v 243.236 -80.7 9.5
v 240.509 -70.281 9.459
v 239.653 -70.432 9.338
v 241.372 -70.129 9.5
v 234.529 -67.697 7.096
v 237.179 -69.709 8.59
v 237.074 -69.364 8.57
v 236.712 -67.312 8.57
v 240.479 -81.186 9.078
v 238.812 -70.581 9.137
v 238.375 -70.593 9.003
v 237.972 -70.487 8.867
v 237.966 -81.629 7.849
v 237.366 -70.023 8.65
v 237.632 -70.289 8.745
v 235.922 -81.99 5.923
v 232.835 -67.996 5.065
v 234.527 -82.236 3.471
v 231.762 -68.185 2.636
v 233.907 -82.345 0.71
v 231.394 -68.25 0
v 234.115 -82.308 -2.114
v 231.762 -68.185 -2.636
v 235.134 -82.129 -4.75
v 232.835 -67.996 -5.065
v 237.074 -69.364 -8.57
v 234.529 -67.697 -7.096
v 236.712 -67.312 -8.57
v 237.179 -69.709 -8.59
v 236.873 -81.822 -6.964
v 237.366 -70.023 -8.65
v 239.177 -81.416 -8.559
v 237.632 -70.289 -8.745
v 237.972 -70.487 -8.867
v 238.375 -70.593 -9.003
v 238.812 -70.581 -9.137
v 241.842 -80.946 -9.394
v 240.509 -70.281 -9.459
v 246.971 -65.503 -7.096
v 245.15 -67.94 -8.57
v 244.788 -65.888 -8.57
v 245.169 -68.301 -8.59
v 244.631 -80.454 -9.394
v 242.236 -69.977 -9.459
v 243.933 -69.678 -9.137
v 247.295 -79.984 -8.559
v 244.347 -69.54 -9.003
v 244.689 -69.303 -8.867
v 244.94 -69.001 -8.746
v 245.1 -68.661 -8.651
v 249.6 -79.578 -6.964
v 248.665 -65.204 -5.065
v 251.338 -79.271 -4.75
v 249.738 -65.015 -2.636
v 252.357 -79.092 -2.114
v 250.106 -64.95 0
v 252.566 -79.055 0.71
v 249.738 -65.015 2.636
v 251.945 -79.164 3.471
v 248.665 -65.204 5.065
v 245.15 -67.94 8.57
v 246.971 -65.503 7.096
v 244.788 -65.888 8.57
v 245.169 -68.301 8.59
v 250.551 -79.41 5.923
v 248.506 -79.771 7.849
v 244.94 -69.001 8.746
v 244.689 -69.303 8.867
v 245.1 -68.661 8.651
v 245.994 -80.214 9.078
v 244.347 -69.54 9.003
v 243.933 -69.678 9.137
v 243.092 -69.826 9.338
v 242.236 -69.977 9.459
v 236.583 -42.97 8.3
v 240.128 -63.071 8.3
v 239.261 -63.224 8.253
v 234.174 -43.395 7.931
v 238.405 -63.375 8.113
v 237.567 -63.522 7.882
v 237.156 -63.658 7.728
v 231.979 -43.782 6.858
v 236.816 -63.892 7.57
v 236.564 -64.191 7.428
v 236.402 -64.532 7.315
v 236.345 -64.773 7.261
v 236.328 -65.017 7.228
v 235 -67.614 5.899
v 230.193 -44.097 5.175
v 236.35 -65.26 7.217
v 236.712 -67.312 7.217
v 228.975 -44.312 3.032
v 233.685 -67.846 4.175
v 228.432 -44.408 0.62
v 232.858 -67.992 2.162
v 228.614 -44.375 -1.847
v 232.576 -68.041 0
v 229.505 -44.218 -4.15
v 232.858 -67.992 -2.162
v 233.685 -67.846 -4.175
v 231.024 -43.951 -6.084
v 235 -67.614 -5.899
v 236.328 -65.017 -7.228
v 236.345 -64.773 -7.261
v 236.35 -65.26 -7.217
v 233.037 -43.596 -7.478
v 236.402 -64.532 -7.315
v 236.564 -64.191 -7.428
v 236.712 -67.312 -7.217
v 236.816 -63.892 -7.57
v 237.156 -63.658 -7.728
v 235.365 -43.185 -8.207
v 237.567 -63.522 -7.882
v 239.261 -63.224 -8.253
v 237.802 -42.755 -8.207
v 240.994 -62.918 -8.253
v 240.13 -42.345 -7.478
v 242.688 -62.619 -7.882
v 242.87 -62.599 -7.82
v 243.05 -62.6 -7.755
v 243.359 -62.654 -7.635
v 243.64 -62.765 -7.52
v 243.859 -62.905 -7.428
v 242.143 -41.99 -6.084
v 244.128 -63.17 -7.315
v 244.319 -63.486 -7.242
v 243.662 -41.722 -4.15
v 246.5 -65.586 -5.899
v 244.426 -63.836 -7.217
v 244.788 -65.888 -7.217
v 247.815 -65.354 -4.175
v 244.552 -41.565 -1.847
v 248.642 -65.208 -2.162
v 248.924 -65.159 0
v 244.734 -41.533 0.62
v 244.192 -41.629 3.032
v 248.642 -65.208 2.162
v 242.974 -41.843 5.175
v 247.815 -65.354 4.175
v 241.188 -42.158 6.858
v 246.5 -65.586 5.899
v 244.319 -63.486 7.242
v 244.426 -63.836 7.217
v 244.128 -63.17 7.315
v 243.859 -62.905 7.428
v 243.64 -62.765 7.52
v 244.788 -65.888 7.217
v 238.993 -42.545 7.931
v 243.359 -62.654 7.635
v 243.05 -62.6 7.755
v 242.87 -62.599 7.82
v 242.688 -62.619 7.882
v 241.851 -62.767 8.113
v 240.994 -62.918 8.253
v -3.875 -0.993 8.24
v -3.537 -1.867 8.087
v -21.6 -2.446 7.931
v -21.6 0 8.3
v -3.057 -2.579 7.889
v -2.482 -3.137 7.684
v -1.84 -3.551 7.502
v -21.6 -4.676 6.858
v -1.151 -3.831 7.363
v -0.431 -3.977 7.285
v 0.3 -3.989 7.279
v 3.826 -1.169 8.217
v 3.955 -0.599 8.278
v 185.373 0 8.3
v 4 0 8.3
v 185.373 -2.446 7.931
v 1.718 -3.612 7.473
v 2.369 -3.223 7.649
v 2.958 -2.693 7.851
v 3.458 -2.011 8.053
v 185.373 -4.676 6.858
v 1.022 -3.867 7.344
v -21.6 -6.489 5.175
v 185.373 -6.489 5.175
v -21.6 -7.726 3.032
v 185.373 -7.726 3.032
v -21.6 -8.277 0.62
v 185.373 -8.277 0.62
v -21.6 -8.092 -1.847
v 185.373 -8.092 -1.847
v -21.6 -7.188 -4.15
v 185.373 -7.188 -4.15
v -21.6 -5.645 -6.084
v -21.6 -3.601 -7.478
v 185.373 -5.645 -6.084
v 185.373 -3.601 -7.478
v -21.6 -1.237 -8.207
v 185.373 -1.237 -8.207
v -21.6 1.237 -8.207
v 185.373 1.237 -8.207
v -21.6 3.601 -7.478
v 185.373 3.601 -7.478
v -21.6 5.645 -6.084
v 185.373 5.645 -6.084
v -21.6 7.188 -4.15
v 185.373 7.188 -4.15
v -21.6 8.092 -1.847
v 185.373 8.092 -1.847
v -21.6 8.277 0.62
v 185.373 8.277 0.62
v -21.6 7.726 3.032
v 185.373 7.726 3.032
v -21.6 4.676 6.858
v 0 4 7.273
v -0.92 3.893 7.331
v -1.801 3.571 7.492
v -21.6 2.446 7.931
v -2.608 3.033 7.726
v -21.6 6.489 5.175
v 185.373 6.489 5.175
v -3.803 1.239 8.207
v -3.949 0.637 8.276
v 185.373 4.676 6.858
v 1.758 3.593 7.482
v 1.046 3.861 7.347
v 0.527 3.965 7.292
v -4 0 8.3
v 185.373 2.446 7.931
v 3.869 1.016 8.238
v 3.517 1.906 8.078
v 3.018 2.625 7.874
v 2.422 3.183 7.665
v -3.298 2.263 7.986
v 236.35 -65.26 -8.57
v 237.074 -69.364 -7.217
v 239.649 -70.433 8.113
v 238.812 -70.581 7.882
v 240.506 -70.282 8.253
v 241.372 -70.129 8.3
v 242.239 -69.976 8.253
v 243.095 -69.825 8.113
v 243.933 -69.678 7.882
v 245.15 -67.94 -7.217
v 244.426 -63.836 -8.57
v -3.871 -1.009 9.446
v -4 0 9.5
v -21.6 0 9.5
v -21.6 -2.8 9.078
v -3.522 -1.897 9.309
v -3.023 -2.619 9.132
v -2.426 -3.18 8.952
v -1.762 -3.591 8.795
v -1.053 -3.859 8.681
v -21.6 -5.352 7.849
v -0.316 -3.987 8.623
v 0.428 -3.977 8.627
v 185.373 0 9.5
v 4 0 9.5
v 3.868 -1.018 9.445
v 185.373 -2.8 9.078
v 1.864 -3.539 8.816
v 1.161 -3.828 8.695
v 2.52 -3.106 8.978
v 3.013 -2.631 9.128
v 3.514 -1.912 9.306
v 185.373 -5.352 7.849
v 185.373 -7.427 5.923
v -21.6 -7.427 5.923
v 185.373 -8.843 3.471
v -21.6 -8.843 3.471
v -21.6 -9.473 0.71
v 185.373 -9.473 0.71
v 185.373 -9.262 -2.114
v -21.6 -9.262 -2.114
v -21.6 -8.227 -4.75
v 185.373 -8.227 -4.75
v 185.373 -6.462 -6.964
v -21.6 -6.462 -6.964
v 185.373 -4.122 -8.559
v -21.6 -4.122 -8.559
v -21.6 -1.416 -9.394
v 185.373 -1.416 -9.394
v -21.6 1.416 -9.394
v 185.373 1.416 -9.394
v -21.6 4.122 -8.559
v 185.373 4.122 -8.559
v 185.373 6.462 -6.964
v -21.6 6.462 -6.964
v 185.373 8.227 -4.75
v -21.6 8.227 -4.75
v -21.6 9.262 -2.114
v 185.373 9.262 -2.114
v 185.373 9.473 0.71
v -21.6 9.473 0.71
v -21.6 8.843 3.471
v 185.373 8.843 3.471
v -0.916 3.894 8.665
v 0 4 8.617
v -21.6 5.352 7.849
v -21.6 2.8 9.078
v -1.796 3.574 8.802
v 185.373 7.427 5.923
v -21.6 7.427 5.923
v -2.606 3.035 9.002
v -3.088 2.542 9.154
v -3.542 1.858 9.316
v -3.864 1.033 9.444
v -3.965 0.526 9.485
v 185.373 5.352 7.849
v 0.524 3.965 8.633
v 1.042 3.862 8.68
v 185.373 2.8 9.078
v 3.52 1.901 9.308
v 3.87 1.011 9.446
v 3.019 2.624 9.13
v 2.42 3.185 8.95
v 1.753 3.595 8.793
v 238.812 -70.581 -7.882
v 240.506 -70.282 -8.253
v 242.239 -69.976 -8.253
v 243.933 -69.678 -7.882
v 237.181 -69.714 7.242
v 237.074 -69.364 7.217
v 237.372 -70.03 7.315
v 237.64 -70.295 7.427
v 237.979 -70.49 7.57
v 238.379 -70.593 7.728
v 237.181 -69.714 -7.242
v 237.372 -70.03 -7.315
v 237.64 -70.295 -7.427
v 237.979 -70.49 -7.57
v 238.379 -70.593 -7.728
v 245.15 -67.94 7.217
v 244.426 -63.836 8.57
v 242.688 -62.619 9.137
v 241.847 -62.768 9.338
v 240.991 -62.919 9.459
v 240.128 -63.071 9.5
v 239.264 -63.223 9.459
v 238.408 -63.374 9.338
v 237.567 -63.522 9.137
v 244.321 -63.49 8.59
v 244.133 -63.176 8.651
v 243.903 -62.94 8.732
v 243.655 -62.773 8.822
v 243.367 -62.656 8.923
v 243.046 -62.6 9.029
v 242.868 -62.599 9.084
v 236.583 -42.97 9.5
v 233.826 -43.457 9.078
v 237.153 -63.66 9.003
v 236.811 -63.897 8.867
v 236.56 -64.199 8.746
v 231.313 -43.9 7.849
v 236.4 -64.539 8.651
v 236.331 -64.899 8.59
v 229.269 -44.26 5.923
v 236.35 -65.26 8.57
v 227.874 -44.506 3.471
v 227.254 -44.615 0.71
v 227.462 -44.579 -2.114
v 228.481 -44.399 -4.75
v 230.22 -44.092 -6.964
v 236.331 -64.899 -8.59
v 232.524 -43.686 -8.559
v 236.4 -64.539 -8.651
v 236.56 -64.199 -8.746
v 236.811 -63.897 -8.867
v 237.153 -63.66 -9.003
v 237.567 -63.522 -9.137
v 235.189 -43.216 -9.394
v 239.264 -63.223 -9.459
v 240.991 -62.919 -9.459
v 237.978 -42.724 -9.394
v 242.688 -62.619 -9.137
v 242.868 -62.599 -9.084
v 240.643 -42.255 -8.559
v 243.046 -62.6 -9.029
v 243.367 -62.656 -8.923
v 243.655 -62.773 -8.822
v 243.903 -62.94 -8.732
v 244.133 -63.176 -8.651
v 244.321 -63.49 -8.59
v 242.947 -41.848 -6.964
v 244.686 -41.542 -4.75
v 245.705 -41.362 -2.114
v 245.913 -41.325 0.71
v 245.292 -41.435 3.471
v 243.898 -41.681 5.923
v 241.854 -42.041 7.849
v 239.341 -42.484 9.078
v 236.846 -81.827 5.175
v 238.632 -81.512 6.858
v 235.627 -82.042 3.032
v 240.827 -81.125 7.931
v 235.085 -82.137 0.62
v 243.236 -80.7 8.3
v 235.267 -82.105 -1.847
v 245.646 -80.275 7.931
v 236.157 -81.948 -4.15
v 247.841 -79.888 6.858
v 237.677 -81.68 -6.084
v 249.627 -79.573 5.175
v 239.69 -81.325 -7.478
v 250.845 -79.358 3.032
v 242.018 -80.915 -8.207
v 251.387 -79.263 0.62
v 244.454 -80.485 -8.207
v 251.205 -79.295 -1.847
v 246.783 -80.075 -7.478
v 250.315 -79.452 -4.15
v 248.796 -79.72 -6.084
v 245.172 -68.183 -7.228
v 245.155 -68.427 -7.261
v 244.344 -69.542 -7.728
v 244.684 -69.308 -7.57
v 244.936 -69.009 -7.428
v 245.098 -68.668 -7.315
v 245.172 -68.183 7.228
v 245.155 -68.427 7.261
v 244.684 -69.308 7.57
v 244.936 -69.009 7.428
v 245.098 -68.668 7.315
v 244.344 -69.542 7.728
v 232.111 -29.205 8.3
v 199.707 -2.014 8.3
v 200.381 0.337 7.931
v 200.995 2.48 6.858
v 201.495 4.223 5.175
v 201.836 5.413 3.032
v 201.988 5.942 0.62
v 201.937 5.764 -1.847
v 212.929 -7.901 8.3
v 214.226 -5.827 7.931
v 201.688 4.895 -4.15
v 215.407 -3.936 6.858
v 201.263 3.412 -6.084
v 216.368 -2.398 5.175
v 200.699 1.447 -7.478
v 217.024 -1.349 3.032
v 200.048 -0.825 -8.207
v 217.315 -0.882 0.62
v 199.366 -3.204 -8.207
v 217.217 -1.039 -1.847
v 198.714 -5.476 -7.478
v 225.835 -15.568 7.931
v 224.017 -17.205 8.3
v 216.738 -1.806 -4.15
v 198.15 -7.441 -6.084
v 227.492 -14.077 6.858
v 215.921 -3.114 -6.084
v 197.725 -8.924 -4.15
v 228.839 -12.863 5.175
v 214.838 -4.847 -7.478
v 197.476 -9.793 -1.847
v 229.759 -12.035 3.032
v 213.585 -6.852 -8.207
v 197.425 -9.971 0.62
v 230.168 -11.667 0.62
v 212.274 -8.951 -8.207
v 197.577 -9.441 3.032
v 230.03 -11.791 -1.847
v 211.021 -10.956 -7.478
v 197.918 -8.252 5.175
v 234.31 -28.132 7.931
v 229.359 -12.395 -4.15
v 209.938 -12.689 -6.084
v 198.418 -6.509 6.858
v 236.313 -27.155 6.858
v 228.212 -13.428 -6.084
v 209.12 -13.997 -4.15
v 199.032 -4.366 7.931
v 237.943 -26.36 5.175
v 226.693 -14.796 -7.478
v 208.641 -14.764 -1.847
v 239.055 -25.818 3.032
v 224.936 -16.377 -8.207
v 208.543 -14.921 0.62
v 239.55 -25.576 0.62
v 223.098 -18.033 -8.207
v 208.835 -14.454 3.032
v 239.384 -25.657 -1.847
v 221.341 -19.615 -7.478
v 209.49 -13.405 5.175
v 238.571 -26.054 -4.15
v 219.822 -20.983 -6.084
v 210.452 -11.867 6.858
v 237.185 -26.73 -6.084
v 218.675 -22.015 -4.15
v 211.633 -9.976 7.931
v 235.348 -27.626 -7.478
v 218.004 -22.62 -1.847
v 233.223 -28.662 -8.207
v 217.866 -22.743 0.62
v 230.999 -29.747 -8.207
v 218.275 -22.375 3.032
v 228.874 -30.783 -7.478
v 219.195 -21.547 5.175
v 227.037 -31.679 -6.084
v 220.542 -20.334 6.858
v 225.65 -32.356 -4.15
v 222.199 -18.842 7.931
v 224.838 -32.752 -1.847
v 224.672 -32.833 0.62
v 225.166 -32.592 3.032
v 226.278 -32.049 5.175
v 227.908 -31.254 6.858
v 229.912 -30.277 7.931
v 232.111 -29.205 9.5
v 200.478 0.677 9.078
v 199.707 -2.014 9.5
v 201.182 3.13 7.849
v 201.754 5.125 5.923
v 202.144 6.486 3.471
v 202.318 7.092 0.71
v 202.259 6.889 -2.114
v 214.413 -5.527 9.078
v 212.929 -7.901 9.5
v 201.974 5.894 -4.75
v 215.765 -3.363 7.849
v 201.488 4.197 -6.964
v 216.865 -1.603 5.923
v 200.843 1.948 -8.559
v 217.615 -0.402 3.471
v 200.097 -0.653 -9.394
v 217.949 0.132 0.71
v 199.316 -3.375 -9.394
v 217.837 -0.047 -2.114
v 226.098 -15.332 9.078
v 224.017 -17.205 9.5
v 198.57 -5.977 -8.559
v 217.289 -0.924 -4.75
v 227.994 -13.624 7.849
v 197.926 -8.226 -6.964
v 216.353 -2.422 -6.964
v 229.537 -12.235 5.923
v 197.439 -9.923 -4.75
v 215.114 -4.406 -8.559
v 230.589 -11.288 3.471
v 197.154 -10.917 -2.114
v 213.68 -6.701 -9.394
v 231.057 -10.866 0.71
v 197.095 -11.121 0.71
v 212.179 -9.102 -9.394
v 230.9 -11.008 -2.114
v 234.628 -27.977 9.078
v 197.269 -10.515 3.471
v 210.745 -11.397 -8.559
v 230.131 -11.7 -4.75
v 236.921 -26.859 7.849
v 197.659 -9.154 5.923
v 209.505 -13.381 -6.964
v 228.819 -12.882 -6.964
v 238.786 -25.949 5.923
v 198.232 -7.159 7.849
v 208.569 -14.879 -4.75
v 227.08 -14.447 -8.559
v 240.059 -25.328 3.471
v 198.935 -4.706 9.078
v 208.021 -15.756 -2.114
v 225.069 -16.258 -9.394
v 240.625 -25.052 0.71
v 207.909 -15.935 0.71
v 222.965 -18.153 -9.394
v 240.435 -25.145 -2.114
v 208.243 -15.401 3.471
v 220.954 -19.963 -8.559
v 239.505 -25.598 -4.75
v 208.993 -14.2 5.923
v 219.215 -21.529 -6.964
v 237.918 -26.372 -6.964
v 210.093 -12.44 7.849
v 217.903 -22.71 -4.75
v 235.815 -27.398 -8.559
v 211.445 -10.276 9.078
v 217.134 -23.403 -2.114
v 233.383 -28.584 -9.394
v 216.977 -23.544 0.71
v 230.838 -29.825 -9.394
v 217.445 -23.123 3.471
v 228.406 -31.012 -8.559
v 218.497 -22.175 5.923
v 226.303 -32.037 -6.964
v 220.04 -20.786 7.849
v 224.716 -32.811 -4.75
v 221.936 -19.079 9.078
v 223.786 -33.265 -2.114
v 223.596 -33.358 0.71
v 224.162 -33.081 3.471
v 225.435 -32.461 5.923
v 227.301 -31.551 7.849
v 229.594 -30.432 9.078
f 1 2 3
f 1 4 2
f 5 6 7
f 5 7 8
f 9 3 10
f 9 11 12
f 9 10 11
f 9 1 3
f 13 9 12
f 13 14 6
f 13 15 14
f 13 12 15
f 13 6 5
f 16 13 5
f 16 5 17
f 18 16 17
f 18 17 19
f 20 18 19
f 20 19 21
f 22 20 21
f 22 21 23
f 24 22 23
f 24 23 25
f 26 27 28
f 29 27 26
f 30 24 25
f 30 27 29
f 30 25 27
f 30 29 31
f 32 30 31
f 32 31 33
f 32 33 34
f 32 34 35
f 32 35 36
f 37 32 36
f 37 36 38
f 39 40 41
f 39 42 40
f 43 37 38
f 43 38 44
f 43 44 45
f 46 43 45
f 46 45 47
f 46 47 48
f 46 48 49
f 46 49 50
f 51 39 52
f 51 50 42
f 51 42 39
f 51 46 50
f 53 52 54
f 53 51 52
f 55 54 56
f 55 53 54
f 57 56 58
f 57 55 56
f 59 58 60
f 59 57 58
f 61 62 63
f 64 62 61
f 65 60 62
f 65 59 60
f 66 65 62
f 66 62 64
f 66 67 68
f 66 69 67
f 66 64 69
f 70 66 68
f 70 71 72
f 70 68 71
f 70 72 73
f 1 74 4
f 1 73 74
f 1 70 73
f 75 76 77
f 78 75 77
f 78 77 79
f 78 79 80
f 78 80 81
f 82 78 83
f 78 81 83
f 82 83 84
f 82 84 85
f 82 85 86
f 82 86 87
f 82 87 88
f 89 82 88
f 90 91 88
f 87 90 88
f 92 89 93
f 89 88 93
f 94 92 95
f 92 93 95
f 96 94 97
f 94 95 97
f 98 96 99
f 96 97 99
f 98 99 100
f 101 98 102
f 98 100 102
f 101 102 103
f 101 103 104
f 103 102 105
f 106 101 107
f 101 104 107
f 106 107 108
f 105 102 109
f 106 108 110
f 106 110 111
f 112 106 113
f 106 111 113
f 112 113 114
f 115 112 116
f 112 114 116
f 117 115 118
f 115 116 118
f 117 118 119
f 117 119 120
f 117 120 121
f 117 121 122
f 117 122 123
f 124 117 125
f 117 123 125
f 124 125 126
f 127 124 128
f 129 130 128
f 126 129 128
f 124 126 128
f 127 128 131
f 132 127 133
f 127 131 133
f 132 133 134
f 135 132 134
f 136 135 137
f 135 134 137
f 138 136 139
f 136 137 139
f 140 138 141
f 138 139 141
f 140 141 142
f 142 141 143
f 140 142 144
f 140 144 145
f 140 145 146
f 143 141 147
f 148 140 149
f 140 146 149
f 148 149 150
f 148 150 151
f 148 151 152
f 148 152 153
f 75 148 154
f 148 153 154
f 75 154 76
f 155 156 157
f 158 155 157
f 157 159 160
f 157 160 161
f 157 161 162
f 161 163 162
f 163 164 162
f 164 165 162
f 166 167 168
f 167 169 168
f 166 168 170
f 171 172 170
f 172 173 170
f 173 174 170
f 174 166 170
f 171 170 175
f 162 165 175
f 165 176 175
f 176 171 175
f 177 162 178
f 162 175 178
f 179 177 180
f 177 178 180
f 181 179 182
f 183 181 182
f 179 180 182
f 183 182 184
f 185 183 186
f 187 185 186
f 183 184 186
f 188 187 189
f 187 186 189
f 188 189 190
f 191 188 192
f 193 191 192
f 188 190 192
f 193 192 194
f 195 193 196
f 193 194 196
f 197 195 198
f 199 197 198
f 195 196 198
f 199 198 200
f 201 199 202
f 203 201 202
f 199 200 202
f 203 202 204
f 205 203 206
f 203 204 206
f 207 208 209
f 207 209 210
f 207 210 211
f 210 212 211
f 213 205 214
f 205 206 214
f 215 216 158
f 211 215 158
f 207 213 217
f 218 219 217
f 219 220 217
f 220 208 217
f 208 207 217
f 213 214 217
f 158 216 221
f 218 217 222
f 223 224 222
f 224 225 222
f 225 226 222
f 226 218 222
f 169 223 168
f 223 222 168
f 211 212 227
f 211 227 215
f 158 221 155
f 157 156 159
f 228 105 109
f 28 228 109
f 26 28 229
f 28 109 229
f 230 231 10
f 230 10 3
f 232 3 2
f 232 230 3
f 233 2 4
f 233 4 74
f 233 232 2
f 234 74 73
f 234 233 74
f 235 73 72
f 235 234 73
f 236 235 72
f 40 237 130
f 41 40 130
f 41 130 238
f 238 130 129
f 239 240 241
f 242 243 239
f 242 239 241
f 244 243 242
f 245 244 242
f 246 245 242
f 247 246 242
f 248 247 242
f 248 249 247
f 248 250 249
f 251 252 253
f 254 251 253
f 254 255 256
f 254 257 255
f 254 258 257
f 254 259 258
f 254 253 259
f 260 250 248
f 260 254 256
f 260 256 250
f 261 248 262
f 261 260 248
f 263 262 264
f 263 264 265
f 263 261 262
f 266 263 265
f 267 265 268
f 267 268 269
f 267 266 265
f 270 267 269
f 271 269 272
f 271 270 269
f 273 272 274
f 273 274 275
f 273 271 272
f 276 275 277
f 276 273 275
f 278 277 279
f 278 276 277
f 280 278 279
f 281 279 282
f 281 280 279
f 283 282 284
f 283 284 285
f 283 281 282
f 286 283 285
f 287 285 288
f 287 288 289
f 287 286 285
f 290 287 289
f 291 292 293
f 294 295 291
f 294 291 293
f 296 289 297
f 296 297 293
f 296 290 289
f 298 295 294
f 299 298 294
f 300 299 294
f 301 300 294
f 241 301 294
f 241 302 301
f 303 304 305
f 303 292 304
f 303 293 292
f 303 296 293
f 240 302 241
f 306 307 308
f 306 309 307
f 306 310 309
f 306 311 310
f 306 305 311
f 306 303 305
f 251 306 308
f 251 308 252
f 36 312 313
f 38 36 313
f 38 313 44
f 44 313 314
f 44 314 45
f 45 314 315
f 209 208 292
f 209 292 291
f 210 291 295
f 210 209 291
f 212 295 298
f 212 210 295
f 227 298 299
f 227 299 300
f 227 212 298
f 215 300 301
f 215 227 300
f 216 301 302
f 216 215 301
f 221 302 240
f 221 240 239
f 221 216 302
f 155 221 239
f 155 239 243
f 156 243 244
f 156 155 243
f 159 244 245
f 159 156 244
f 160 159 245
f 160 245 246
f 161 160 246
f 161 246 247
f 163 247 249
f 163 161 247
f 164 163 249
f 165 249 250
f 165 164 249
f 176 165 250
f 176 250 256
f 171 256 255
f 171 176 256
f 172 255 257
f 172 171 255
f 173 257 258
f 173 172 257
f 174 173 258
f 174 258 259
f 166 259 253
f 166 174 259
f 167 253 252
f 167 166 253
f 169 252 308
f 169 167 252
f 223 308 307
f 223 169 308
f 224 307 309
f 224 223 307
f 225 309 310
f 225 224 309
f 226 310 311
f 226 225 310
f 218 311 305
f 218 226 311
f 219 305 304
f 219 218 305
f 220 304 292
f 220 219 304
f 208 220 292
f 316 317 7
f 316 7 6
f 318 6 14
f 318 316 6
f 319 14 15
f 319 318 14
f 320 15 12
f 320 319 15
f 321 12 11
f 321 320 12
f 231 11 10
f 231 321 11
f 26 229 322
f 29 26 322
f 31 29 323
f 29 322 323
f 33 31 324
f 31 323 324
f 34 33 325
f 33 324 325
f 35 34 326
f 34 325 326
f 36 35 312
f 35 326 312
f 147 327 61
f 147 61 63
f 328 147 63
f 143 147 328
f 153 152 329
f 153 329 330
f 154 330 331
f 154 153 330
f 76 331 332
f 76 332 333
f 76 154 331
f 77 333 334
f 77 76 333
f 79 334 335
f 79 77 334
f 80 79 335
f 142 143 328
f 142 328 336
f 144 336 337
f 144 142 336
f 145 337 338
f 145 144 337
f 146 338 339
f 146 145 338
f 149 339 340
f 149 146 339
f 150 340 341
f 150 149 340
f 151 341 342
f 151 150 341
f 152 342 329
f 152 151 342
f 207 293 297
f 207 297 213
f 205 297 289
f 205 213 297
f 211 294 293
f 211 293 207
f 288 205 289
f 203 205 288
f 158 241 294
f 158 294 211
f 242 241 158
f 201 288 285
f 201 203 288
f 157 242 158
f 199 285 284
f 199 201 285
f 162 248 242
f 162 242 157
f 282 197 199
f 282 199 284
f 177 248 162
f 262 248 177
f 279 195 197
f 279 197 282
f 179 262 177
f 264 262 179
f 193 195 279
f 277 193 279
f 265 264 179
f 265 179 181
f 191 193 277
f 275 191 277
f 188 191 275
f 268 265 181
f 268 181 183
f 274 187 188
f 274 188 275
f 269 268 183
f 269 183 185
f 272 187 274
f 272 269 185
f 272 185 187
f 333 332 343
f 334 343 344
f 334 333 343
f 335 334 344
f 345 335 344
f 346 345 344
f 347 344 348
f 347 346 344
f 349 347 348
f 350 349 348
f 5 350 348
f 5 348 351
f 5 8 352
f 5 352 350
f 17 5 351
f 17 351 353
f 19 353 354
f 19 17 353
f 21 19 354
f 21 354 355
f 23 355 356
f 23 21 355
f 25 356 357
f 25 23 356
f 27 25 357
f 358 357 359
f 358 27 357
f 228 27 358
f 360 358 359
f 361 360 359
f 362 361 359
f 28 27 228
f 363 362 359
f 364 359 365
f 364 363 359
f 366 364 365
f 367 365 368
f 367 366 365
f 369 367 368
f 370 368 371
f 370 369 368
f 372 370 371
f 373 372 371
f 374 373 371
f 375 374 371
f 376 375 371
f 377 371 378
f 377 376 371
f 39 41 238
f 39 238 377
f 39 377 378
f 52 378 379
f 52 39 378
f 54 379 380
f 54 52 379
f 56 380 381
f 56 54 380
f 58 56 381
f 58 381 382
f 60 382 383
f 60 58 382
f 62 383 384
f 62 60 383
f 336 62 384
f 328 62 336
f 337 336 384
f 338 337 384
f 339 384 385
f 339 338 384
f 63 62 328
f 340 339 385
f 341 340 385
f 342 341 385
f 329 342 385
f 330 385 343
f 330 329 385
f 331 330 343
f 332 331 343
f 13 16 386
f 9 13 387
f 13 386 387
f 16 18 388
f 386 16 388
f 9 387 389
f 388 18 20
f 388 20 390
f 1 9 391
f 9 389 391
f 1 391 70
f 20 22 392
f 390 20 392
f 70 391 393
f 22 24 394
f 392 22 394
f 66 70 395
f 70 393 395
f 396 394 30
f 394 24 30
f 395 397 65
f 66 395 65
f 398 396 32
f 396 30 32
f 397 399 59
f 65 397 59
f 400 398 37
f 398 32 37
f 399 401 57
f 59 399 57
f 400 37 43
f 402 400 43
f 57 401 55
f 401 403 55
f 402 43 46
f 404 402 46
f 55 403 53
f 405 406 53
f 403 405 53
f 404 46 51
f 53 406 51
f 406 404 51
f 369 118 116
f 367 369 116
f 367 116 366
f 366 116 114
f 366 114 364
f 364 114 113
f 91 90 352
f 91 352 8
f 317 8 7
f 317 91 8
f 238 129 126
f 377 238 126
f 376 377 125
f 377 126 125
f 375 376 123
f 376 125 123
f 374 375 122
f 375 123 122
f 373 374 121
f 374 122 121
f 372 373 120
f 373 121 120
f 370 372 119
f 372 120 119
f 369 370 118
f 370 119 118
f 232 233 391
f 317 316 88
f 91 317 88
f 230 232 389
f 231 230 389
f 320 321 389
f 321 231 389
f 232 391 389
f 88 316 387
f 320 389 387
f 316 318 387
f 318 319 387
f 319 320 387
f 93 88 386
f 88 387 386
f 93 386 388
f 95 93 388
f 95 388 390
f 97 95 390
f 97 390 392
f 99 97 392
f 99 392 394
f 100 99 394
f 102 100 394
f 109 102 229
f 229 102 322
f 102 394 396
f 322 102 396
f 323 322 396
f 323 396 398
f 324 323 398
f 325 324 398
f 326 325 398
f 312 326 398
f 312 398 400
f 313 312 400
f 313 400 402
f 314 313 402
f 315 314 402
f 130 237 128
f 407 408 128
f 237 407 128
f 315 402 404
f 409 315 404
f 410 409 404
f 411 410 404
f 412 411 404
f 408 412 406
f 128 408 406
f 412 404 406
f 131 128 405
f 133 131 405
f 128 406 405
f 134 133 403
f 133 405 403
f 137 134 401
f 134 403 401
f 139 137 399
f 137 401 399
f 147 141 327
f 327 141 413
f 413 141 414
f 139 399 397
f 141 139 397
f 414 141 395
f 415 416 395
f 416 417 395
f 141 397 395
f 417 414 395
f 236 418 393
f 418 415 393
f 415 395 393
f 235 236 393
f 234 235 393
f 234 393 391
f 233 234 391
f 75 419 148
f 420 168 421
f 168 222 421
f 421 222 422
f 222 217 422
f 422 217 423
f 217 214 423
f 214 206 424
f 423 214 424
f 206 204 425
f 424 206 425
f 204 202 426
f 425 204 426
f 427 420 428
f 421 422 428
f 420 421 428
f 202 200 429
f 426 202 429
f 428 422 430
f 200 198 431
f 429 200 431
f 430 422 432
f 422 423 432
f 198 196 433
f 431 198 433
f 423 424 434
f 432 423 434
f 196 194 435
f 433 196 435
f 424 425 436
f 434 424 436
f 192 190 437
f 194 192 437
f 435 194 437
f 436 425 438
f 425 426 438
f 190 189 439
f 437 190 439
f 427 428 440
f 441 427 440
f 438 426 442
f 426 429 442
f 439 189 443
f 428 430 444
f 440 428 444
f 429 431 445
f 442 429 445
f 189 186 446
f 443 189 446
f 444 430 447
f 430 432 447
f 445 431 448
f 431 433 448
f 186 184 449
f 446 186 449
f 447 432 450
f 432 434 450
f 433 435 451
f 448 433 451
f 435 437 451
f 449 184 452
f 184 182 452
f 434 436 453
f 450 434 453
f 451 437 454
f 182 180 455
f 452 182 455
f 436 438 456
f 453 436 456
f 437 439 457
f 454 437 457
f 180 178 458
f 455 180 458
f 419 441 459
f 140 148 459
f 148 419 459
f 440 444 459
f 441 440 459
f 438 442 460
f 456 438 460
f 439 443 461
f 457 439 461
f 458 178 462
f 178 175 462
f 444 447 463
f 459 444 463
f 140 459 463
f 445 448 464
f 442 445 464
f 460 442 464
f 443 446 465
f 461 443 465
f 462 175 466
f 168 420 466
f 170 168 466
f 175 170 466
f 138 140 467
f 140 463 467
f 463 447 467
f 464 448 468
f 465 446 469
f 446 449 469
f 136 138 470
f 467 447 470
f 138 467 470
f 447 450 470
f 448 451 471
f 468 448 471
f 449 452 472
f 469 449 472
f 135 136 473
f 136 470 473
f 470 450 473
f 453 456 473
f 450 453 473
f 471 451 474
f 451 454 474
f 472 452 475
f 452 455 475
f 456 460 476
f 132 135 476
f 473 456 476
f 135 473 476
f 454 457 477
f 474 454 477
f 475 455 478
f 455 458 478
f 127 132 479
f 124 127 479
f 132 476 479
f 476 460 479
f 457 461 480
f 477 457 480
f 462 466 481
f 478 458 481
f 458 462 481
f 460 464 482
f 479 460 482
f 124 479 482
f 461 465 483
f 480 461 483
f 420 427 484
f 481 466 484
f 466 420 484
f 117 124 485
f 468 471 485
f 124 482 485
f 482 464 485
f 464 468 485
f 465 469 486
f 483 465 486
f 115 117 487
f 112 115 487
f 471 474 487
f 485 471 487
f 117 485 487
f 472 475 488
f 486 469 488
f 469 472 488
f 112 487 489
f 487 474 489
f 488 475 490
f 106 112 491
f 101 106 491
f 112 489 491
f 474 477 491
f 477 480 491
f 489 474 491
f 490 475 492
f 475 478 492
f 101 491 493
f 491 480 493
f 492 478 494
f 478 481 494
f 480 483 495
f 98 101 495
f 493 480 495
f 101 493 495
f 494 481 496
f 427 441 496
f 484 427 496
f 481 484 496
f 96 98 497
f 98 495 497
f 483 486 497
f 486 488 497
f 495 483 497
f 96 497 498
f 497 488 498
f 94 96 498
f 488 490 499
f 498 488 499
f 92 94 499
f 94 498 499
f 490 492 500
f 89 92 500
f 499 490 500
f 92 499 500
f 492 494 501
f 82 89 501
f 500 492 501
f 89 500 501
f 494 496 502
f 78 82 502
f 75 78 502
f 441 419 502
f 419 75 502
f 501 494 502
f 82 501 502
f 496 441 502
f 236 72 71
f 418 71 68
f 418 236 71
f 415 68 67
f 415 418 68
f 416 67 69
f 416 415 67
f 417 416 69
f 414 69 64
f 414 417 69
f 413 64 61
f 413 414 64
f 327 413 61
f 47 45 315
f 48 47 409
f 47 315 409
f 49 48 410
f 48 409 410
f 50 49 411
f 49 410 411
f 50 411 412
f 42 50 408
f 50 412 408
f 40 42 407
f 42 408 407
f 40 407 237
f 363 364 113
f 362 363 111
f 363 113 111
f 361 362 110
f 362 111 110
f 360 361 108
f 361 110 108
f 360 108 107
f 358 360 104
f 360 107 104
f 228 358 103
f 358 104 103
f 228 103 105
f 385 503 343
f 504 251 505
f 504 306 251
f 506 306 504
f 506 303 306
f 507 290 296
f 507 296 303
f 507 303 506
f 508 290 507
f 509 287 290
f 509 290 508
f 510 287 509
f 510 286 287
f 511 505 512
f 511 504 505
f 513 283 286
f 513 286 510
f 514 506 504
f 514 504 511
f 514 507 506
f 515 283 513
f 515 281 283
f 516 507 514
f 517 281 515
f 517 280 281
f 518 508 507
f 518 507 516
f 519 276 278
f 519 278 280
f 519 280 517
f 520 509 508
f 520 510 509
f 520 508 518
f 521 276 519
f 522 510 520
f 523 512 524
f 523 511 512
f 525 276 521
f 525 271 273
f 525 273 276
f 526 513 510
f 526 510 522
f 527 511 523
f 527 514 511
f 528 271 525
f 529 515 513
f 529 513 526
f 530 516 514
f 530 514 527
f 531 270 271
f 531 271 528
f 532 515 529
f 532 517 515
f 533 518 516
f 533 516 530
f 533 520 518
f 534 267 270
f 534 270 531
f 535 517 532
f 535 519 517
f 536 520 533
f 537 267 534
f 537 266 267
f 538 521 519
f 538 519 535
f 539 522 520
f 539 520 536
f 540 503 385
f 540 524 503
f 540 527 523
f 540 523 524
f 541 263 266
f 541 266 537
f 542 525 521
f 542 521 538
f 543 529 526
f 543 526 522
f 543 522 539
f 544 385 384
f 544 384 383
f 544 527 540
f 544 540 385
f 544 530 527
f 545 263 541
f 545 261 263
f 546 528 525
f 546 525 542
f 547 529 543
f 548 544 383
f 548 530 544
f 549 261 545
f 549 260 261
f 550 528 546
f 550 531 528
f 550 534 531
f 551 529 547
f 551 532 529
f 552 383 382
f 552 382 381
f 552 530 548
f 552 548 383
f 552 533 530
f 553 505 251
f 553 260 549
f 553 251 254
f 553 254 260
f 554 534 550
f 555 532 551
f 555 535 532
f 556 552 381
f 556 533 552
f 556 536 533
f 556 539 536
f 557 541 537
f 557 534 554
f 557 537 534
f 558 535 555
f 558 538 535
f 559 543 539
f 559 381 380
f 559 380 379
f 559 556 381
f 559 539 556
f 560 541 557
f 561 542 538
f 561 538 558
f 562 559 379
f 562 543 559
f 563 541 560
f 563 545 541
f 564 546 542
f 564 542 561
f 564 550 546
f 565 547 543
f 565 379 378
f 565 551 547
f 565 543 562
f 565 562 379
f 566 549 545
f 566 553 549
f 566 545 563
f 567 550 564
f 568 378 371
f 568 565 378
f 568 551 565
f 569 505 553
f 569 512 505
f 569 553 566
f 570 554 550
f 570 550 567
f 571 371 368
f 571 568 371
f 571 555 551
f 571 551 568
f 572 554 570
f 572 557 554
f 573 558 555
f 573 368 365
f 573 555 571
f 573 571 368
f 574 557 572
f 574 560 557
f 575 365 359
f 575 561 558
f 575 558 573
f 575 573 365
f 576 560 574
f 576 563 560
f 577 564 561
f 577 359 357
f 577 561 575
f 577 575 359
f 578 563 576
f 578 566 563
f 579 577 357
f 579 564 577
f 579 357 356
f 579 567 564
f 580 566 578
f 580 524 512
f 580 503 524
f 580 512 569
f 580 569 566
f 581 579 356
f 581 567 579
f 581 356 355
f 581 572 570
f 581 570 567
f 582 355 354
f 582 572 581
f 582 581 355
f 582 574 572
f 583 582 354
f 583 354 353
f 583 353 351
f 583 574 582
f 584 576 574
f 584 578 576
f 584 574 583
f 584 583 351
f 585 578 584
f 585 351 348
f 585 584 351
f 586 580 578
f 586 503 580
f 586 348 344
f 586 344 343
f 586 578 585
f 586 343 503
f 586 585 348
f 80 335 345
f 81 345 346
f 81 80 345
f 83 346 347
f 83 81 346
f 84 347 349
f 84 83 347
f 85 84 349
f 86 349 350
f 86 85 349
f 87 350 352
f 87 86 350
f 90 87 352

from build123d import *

# Parameters (mm, degrees)
SKETCH2_R                      = 9.5
SKETCH2_R_2                    = 8.3
CUT_EXTRUDE1_REACH             = 267.847
CUT_EXTRUDE1_DIRECTION_2_REACH = 267.847
CUT_EXTRUDE2_REACH             = 267.847
CUT_EXTRUDE2_END_RADIUS        = 9.5
SKETCH4_R                      = 4


with BuildPart() as part:
    # Sweep1: sweep along a path in Sketch1
    with BuildLine(Plane.XY) as sweep1_path:
        Line((-21.6, 0), (0, 0))
        Line((0, 0), (185.373442264, 0))
        ThreePointArc((185.373442264, 0), (218.798397967, -12.165688958), (236.58344542, -42.970294761))
        Line((236.58344542, -42.970294761), (240.75, -66.6))
        Line((240.75, -66.6), (243.236210428, -80.7))
    # Sketch2 → Sweep1 (sweep)
    with BuildSketch(Plane.ZY.offset(21.6)):
        Circle(SKETCH2_R)
        Circle(SKETCH2_R_2, mode=Mode.SUBTRACT)
    sweep(path=sweep1_path.line)

    # Sketch3 → Cut-Extrude1 (cut, up to next)
    with BuildSketch(Plane.XY, mode=Mode.PRIVATE) as cut_extrude1_sk1:
        with BuildLine():
            Line((245.149518391, -67.939949686), (244.425905183, -63.836135257))
            ThreePointArc((244.425905183, -63.836135257), (243.809058208, -62.867879457), (242.688221287, -62.619395894))
            Line((242.688221287, -62.619395894), (237.567220972, -63.522366418))
            ThreePointArc((237.567220972, -63.522366418), (236.598965172, -64.139213393), (236.350481609, -65.260050314))
            Line((236.350481609, -65.260050314), (237.074094817, -69.363864743))
            ThreePointArc((237.074094817, -69.363864743), (237.690941792, -70.332120543), (238.811778713, -70.580604106))
            Line((238.811778713, -70.580604106), (243.932779028, -69.677633582))
            ThreePointArc((243.932779028, -69.677633582), (244.901034828, -69.060786607), (245.149518391, -67.939949686))
        make_face()
    cut_extrude1_tool1 = extrude(cut_extrude1_sk1.sketch, amount=-CUT_EXTRUDE1_REACH, mode=Mode.PRIVATE) & part.part
    add(cut_extrude1_tool1.solids().sort_by_distance((240.75, -66.6, 0))[0], mode=Mode.SUBTRACT)

    # Sketch3 → Cut-Extrude1 direction 2 (cut, up to next)
    with BuildSketch(Plane.XY, mode=Mode.PRIVATE) as cut_extrude1_direction_2_sk1:
        with BuildLine():
            Line((245.149518391, -67.939949686), (244.425905183, -63.836135257))
            ThreePointArc((244.425905183, -63.836135257), (243.809058208, -62.867879457), (242.688221287, -62.619395894))
            Line((242.688221287, -62.619395894), (237.567220972, -63.522366418))
            ThreePointArc((237.567220972, -63.522366418), (236.598965172, -64.139213393), (236.350481609, -65.260050314))
            Line((236.350481609, -65.260050314), (237.074094817, -69.363864743))
            ThreePointArc((237.074094817, -69.363864743), (237.690941792, -70.332120543), (238.811778713, -70.580604106))
            Line((238.811778713, -70.580604106), (243.932779028, -69.677633582))
            ThreePointArc((243.932779028, -69.677633582), (244.901034828, -69.060786607), (245.149518391, -67.939949686))
        make_face()
    cut_extrude1_direction_2_tool1 = extrude(cut_extrude1_direction_2_sk1.sketch, amount=CUT_EXTRUDE1_DIRECTION_2_REACH, mode=Mode.PRIVATE) & part.part
    add(cut_extrude1_direction_2_tool1.solids().sort_by_distance((240.75, -66.6, 0))[0], mode=Mode.SUBTRACT)

    # Cut-Extrude2: up to this cylinder (the profile starts inside it)
    cut_extrude2_end = Plane(origin=(0, 0, 0), z_dir=(-1, 0, 0)) * Cylinder(CUT_EXTRUDE2_END_RADIUS, 555.694, mode=Mode.PRIVATE)
    # Sketch4 → Cut-Extrude2 (cut, up to the surface)
    with BuildSketch(Plane.XY, mode=Mode.PRIVATE) as cut_extrude2_sk1:
        with Locations(Location((0, 0, 0), (0, 0, 90))):
            Circle(SKETCH4_R)
    cut_extrude2_tool1 = extrude(cut_extrude2_sk1.sketch, amount=CUT_EXTRUDE2_REACH, mode=Mode.PRIVATE) & cut_extrude2_end
    add(cut_extrude2_tool1.solids().sort_by_distance((0, 0, 0))[0], mode=Mode.SUBTRACT)


solid = part.part
